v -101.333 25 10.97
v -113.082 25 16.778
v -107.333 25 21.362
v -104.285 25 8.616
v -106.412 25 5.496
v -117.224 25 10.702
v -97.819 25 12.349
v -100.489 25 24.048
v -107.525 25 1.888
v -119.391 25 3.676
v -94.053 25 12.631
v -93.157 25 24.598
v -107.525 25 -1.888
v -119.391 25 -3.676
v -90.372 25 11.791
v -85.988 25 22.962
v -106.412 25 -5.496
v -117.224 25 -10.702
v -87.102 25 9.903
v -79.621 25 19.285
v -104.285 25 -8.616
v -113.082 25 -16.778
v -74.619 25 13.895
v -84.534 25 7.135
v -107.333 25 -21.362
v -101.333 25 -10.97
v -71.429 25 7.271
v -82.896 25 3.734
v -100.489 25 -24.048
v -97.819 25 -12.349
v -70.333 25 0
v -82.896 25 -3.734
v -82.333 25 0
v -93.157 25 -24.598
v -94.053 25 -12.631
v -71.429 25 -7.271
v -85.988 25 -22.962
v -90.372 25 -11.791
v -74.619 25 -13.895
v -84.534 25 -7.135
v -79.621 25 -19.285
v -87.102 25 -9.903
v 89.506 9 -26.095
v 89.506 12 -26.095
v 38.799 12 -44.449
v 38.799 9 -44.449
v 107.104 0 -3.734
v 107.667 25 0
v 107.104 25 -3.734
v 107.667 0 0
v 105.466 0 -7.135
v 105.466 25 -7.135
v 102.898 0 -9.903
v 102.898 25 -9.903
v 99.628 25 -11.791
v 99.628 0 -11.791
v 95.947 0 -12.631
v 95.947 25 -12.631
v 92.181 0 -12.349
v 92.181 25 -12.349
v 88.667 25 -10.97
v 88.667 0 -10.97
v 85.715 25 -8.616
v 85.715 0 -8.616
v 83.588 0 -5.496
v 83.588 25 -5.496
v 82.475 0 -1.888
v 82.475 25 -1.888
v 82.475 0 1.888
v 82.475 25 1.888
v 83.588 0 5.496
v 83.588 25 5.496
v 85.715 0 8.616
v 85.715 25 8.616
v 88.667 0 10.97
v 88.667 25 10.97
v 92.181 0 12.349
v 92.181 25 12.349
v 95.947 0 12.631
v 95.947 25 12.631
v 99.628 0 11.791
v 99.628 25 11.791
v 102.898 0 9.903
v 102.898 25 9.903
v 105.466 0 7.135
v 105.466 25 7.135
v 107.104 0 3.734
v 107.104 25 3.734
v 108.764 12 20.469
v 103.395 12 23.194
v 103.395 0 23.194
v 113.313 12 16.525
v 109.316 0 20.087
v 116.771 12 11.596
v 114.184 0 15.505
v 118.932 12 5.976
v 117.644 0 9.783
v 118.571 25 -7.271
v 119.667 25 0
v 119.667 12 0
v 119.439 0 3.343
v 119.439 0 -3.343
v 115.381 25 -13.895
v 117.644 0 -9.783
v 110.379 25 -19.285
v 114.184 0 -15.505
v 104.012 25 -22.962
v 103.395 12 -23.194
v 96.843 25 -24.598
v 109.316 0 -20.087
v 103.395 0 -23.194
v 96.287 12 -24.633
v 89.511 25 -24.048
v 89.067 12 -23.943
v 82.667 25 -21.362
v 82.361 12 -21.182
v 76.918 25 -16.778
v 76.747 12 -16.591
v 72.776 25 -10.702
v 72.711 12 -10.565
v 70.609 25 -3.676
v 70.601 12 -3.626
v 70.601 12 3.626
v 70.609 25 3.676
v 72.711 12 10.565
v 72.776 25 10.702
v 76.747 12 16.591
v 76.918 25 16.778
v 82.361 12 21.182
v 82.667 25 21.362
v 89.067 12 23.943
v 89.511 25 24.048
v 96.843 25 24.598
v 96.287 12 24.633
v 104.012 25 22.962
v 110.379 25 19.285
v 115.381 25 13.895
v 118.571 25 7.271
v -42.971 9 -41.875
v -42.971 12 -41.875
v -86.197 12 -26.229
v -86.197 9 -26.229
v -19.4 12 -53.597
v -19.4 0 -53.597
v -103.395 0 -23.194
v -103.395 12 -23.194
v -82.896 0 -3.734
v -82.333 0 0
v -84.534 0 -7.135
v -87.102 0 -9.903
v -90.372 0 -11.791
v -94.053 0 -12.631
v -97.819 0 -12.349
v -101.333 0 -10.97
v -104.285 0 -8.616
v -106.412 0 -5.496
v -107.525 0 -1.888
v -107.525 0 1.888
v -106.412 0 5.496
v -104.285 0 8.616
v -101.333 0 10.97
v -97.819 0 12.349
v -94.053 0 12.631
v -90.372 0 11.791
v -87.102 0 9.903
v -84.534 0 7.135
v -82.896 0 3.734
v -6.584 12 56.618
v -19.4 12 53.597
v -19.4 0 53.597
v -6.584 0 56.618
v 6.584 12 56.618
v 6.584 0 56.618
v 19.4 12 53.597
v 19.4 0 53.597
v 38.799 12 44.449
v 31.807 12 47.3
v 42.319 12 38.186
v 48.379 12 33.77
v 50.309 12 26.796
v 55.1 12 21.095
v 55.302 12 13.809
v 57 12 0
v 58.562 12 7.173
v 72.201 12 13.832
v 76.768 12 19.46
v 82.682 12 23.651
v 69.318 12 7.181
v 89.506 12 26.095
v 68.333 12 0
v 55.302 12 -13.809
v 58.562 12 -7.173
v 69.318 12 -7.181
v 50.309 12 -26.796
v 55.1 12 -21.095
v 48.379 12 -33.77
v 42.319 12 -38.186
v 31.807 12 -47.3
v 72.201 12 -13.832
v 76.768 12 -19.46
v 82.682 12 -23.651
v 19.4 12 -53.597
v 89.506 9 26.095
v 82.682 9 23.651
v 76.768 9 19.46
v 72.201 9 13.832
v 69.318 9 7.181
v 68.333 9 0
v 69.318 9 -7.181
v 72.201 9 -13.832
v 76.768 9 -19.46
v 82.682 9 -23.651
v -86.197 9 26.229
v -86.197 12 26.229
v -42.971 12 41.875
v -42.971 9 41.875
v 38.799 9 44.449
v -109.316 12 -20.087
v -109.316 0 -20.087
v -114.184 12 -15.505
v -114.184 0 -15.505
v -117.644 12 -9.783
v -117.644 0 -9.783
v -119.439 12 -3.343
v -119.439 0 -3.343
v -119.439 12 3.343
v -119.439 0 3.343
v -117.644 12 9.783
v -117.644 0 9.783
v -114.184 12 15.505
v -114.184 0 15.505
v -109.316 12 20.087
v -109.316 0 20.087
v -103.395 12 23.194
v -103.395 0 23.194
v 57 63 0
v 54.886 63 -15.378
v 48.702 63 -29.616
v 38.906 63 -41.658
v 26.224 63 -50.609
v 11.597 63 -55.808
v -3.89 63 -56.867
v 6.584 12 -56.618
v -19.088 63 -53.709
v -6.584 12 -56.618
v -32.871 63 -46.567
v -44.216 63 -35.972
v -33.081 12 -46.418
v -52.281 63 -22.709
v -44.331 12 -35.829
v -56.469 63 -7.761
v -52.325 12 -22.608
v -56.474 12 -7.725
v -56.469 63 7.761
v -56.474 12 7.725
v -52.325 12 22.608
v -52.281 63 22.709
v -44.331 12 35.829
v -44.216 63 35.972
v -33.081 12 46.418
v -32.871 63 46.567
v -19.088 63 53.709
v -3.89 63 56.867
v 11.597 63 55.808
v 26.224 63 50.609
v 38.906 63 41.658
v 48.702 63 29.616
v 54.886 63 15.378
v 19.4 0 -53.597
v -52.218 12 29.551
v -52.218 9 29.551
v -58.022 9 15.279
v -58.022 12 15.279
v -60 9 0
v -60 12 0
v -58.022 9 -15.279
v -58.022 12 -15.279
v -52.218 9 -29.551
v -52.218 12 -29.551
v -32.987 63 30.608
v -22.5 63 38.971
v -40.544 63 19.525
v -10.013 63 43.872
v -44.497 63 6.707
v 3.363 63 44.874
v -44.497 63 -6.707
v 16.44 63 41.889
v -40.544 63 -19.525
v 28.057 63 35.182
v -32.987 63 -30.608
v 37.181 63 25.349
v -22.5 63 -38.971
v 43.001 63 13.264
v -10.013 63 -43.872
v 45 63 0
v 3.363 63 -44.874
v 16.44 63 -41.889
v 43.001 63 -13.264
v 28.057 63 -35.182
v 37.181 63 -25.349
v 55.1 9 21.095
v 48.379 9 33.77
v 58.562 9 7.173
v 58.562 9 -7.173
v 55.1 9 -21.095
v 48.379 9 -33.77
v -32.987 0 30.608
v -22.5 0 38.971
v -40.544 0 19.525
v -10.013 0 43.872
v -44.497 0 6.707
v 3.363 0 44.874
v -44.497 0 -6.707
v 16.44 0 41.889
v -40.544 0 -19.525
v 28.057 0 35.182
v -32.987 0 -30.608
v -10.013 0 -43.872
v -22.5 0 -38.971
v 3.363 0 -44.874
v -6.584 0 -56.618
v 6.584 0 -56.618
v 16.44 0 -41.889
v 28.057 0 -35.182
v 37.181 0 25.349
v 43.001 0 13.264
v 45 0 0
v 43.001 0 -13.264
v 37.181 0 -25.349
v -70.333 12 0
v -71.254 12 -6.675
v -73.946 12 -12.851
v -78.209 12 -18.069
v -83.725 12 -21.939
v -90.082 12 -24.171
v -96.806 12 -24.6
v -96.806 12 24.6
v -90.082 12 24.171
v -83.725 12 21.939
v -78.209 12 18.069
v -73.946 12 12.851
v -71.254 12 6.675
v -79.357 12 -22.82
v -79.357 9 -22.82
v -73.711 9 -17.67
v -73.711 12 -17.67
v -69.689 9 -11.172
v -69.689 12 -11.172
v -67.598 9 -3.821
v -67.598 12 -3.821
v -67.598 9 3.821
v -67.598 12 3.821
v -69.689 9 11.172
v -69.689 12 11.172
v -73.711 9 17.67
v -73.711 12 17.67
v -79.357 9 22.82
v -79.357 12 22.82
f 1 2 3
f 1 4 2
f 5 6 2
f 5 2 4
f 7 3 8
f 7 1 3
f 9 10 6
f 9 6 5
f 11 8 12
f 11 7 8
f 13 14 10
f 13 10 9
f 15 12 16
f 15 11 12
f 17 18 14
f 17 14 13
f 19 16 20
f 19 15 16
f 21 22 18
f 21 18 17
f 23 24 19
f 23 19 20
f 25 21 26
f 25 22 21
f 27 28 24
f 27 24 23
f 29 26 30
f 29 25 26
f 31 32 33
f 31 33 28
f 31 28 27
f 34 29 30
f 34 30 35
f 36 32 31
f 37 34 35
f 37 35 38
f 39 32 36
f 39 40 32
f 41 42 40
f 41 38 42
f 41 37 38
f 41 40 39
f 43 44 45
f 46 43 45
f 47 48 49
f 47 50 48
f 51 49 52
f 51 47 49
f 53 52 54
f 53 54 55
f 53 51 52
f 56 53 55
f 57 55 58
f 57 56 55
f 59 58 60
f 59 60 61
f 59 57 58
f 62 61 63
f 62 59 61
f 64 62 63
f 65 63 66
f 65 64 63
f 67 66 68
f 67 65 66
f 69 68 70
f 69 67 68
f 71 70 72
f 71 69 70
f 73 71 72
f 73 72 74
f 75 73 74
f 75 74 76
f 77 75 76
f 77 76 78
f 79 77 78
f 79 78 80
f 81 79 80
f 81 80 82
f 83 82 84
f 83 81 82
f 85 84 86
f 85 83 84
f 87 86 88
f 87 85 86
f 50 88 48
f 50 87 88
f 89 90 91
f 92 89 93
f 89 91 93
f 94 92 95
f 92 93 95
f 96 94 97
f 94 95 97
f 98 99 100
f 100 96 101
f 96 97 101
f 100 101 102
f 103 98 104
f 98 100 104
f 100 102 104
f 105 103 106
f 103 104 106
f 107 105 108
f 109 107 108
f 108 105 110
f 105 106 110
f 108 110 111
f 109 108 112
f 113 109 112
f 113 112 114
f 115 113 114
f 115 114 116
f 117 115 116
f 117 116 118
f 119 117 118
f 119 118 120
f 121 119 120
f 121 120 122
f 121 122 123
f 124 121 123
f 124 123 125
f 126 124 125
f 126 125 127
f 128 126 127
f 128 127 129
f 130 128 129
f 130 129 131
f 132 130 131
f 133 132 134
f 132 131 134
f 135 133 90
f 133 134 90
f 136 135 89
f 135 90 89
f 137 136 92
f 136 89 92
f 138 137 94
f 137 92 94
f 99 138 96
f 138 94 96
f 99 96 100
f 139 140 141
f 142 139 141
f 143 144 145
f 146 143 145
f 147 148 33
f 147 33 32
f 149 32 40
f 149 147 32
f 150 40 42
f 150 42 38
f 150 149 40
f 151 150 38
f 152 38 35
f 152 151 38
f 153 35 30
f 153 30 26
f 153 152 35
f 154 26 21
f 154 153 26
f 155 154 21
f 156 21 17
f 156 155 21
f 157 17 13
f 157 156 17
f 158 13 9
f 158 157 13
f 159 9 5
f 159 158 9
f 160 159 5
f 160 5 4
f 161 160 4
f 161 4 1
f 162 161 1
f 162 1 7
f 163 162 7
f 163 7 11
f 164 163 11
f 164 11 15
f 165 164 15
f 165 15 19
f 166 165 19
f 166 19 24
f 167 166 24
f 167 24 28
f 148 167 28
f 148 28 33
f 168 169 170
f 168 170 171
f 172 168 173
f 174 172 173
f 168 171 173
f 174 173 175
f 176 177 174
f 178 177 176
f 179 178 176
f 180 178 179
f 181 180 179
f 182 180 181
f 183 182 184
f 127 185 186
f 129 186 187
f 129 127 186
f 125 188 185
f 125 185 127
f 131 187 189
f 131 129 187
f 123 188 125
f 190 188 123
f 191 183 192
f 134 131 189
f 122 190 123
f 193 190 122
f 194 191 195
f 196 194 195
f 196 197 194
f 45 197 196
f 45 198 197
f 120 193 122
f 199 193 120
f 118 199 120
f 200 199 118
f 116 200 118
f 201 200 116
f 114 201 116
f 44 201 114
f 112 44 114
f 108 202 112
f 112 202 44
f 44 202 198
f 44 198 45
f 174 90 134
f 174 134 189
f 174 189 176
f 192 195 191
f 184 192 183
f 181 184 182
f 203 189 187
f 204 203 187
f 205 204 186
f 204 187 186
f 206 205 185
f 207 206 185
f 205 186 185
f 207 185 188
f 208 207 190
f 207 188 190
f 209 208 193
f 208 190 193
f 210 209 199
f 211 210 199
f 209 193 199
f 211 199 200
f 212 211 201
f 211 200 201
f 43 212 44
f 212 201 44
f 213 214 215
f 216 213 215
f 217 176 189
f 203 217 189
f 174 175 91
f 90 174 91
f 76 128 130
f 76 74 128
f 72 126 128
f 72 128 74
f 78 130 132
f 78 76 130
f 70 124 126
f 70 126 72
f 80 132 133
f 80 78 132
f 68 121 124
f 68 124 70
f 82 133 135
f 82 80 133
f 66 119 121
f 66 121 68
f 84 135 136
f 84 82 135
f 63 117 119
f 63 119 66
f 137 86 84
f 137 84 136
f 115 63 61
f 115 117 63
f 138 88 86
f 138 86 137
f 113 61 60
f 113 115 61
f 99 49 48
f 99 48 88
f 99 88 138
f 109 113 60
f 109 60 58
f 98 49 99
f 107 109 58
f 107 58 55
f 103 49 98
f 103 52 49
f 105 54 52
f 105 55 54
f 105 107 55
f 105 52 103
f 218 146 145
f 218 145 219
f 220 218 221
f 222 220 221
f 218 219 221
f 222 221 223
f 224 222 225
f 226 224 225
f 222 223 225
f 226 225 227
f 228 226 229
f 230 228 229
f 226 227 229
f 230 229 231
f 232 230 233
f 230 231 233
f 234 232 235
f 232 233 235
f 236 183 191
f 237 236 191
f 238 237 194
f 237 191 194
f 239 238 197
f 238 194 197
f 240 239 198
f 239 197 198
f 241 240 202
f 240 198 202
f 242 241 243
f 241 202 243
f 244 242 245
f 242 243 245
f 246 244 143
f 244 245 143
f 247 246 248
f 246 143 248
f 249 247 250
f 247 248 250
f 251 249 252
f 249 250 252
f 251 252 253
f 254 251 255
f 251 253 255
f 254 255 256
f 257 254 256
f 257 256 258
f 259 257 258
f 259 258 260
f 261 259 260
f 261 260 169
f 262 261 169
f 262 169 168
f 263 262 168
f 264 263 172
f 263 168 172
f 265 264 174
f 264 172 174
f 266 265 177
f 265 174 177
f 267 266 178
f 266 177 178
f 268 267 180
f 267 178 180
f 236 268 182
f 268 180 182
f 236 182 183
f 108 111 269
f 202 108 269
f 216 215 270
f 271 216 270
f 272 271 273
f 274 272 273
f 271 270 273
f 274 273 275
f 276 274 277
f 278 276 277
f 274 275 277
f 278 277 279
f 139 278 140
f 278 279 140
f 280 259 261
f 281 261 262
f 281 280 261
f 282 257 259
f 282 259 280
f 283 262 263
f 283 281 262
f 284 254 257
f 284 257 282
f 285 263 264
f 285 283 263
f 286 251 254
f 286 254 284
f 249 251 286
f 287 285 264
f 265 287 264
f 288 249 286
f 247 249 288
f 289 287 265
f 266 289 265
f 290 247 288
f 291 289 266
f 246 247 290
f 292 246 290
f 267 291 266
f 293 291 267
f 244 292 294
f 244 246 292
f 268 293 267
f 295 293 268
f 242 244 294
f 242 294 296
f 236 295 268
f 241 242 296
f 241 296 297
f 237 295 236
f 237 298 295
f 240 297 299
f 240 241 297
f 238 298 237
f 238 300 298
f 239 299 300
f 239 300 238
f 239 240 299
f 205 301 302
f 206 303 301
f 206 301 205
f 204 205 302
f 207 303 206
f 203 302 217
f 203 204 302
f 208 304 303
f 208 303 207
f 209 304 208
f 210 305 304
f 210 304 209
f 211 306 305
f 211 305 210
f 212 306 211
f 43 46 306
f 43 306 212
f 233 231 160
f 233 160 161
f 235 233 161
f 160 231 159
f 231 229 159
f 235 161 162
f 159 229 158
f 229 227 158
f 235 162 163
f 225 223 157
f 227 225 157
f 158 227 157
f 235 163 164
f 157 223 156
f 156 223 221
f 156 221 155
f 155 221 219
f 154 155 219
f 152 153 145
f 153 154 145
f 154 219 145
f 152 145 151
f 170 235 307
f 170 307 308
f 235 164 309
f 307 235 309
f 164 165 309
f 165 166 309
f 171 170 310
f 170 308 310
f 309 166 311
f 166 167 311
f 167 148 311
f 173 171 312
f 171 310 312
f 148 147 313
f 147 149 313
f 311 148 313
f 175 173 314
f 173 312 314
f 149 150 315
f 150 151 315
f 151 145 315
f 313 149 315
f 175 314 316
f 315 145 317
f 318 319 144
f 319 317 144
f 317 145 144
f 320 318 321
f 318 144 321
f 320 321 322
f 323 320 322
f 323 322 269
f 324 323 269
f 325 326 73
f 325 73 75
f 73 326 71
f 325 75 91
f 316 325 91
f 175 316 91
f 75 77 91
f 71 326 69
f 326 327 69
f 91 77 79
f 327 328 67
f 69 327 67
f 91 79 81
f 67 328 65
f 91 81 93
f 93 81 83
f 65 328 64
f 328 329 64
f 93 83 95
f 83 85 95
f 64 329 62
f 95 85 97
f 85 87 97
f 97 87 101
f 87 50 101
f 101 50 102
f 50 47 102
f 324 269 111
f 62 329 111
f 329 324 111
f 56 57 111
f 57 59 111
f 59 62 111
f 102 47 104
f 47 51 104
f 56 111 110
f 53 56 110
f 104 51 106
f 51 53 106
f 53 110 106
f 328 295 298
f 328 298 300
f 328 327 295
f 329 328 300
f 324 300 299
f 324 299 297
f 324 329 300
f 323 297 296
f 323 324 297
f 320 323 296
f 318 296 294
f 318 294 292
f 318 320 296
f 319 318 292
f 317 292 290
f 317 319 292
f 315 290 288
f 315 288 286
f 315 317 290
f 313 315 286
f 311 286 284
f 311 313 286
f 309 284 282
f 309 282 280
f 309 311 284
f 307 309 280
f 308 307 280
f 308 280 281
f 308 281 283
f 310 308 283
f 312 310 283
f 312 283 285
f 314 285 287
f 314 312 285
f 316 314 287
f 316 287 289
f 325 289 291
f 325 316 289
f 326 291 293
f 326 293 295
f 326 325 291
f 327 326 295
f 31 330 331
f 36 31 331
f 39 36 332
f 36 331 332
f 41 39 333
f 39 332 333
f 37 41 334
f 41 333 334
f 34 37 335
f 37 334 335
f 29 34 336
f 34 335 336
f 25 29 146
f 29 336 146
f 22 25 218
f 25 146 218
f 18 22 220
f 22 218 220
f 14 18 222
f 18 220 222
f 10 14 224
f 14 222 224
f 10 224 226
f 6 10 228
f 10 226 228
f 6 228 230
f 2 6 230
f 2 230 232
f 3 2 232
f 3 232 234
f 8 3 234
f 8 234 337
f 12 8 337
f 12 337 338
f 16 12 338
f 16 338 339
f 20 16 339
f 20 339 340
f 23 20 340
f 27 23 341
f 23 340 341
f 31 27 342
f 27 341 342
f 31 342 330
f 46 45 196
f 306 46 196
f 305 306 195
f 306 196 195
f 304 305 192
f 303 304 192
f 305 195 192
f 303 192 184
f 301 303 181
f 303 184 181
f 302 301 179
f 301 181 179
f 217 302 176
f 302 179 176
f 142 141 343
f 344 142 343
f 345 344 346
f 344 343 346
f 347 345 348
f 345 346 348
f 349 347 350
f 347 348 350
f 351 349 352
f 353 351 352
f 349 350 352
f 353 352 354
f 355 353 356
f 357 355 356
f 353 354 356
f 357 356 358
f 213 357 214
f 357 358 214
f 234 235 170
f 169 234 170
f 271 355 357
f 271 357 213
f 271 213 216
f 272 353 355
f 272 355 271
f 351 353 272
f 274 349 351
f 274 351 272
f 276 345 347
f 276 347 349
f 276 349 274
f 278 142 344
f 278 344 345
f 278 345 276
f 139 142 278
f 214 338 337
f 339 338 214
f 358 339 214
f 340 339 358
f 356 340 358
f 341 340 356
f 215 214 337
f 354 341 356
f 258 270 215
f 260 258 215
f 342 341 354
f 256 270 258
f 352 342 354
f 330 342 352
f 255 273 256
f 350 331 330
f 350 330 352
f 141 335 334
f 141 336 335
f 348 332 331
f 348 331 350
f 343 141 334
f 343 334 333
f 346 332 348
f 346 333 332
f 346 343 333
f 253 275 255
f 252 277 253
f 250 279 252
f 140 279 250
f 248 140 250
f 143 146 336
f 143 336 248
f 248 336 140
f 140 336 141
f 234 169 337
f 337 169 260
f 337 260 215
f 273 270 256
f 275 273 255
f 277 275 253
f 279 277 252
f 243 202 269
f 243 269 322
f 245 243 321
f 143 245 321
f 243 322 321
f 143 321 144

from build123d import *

# Parameters (mm, degrees)
SKETCH1_R           = 12.666666667
SKETCH1_R_2         = 45
BOSS_EXTRUDE1_DEPTH = 12
SKETCH2_R           = 57
SKETCH2_R_2         = 45
BOSS_EXTRUDE2_DEPTH = 51
SKETCH3_R           = 24.666666667
SKETCH3_R_2         = 12.666666667
BOSS_EXTRUDE3_DEPTH = 13
CUT_EXTRUDE1_DEPTH  = 3


with BuildPart() as part:
    # Sketch1 → Boss-Extrude1 (new body)
    with BuildSketch(Plane(origin=(0, 0, 0), x_dir=(1, 0, 0), z_dir=(0, 1, 0))):
        with BuildLine():
            Line((-19.4, 53.597014842), (-103.395321637, 23.194029815))
            ThreePointArc((-103.395321637, 23.194029815), (-119.666666667, 0), (-103.395321637, -23.194029815))
            Line((-103.395321637, -23.194029815), (-19.4, -53.597014842))
            ThreePointArc((-19.4, -53.597014842), (0, -57), (19.4, -53.597014842))
            Line((19.4, -53.597014842), (103.395321637, -23.194029815))
            ThreePointArc((103.395321637, -23.194029815), (119.666666667, 0), (103.395321637, 23.194029815))
            Line((103.395321637, 23.194029815), (19.4, 53.597014842))
            ThreePointArc((19.4, 53.597014842), (0, 57), (-19.4, 53.597014842))
        make_face()
        with Locations((-95, 0)):
            Circle(SKETCH1_R, mode=Mode.SUBTRACT)
        Circle(SKETCH1_R_2, mode=Mode.SUBTRACT)
        with Locations((95, 0)):
            Circle(SKETCH1_R, mode=Mode.SUBTRACT)
    extrude(amount=BOSS_EXTRUDE1_DEPTH)

    # Sketch2 → Boss-Extrude2 (add)
    with BuildSketch(Plane(origin=(0, 12, 0), x_dir=(1, 0, 0), z_dir=(0, 1, 0))):
        Circle(SKETCH2_R)
        Circle(SKETCH2_R_2, mode=Mode.SUBTRACT)
    extrude(amount=BOSS_EXTRUDE2_DEPTH)

    # Sketch3 → Boss-Extrude3 (add)
    with BuildSketch(Plane(origin=(0, 12, 0), x_dir=(1, 0, 0), z_dir=(0, 1, 0))):
        with Locations((95, 0)):
            Circle(SKETCH3_R)
        with Locations((95, 0)):
            Circle(SKETCH3_R_2, mode=Mode.SUBTRACT)
        with Locations((-95, 0)):
            Circle(SKETCH3_R)
        with Locations((-95, 0)):
            Circle(SKETCH3_R_2, mode=Mode.SUBTRACT)
    extrude(amount=BOSS_EXTRUDE3_DEPTH)

    # Sketch4 → Cut-Extrude1 (cut)
    with BuildSketch(Plane(origin=(0, 12, 0), x_dir=(1, 0, 0), z_dir=(0, 1, 0))):
        with BuildLine():
            Line((-42.970944355, 41.87478885), (-86.196761812, 26.228752198))
            ThreePointArc((-86.196761812, 26.228752198), (-67.333333333, 0), (-86.196761812, -26.228752198))
            Line((-86.196761812, -26.228752198), (-42.970944355, -41.87478885))
            ThreePointArc((-42.970944355, -41.87478885), (-60, 0), (-42.970944355, 41.87478885))
        make_face()
        with BuildLine():
            Line((38.798579703, -44.448511932), (89.505740572, -26.094524798))
            ThreePointArc((89.505740572, -26.094524798), (68.333333333, 0), (89.505740572, 26.094524798))
            Line((89.505740572, 26.094524798), (38.798579703, 44.448511932))
            ThreePointArc((38.798579703, 44.448511932), (59, 0), (38.798579703, -44.448511932))
        make_face()
    extrude(amount=-CUT_EXTRUDE1_DEPTH, mode=Mode.SUBTRACT)


solid = part.part
